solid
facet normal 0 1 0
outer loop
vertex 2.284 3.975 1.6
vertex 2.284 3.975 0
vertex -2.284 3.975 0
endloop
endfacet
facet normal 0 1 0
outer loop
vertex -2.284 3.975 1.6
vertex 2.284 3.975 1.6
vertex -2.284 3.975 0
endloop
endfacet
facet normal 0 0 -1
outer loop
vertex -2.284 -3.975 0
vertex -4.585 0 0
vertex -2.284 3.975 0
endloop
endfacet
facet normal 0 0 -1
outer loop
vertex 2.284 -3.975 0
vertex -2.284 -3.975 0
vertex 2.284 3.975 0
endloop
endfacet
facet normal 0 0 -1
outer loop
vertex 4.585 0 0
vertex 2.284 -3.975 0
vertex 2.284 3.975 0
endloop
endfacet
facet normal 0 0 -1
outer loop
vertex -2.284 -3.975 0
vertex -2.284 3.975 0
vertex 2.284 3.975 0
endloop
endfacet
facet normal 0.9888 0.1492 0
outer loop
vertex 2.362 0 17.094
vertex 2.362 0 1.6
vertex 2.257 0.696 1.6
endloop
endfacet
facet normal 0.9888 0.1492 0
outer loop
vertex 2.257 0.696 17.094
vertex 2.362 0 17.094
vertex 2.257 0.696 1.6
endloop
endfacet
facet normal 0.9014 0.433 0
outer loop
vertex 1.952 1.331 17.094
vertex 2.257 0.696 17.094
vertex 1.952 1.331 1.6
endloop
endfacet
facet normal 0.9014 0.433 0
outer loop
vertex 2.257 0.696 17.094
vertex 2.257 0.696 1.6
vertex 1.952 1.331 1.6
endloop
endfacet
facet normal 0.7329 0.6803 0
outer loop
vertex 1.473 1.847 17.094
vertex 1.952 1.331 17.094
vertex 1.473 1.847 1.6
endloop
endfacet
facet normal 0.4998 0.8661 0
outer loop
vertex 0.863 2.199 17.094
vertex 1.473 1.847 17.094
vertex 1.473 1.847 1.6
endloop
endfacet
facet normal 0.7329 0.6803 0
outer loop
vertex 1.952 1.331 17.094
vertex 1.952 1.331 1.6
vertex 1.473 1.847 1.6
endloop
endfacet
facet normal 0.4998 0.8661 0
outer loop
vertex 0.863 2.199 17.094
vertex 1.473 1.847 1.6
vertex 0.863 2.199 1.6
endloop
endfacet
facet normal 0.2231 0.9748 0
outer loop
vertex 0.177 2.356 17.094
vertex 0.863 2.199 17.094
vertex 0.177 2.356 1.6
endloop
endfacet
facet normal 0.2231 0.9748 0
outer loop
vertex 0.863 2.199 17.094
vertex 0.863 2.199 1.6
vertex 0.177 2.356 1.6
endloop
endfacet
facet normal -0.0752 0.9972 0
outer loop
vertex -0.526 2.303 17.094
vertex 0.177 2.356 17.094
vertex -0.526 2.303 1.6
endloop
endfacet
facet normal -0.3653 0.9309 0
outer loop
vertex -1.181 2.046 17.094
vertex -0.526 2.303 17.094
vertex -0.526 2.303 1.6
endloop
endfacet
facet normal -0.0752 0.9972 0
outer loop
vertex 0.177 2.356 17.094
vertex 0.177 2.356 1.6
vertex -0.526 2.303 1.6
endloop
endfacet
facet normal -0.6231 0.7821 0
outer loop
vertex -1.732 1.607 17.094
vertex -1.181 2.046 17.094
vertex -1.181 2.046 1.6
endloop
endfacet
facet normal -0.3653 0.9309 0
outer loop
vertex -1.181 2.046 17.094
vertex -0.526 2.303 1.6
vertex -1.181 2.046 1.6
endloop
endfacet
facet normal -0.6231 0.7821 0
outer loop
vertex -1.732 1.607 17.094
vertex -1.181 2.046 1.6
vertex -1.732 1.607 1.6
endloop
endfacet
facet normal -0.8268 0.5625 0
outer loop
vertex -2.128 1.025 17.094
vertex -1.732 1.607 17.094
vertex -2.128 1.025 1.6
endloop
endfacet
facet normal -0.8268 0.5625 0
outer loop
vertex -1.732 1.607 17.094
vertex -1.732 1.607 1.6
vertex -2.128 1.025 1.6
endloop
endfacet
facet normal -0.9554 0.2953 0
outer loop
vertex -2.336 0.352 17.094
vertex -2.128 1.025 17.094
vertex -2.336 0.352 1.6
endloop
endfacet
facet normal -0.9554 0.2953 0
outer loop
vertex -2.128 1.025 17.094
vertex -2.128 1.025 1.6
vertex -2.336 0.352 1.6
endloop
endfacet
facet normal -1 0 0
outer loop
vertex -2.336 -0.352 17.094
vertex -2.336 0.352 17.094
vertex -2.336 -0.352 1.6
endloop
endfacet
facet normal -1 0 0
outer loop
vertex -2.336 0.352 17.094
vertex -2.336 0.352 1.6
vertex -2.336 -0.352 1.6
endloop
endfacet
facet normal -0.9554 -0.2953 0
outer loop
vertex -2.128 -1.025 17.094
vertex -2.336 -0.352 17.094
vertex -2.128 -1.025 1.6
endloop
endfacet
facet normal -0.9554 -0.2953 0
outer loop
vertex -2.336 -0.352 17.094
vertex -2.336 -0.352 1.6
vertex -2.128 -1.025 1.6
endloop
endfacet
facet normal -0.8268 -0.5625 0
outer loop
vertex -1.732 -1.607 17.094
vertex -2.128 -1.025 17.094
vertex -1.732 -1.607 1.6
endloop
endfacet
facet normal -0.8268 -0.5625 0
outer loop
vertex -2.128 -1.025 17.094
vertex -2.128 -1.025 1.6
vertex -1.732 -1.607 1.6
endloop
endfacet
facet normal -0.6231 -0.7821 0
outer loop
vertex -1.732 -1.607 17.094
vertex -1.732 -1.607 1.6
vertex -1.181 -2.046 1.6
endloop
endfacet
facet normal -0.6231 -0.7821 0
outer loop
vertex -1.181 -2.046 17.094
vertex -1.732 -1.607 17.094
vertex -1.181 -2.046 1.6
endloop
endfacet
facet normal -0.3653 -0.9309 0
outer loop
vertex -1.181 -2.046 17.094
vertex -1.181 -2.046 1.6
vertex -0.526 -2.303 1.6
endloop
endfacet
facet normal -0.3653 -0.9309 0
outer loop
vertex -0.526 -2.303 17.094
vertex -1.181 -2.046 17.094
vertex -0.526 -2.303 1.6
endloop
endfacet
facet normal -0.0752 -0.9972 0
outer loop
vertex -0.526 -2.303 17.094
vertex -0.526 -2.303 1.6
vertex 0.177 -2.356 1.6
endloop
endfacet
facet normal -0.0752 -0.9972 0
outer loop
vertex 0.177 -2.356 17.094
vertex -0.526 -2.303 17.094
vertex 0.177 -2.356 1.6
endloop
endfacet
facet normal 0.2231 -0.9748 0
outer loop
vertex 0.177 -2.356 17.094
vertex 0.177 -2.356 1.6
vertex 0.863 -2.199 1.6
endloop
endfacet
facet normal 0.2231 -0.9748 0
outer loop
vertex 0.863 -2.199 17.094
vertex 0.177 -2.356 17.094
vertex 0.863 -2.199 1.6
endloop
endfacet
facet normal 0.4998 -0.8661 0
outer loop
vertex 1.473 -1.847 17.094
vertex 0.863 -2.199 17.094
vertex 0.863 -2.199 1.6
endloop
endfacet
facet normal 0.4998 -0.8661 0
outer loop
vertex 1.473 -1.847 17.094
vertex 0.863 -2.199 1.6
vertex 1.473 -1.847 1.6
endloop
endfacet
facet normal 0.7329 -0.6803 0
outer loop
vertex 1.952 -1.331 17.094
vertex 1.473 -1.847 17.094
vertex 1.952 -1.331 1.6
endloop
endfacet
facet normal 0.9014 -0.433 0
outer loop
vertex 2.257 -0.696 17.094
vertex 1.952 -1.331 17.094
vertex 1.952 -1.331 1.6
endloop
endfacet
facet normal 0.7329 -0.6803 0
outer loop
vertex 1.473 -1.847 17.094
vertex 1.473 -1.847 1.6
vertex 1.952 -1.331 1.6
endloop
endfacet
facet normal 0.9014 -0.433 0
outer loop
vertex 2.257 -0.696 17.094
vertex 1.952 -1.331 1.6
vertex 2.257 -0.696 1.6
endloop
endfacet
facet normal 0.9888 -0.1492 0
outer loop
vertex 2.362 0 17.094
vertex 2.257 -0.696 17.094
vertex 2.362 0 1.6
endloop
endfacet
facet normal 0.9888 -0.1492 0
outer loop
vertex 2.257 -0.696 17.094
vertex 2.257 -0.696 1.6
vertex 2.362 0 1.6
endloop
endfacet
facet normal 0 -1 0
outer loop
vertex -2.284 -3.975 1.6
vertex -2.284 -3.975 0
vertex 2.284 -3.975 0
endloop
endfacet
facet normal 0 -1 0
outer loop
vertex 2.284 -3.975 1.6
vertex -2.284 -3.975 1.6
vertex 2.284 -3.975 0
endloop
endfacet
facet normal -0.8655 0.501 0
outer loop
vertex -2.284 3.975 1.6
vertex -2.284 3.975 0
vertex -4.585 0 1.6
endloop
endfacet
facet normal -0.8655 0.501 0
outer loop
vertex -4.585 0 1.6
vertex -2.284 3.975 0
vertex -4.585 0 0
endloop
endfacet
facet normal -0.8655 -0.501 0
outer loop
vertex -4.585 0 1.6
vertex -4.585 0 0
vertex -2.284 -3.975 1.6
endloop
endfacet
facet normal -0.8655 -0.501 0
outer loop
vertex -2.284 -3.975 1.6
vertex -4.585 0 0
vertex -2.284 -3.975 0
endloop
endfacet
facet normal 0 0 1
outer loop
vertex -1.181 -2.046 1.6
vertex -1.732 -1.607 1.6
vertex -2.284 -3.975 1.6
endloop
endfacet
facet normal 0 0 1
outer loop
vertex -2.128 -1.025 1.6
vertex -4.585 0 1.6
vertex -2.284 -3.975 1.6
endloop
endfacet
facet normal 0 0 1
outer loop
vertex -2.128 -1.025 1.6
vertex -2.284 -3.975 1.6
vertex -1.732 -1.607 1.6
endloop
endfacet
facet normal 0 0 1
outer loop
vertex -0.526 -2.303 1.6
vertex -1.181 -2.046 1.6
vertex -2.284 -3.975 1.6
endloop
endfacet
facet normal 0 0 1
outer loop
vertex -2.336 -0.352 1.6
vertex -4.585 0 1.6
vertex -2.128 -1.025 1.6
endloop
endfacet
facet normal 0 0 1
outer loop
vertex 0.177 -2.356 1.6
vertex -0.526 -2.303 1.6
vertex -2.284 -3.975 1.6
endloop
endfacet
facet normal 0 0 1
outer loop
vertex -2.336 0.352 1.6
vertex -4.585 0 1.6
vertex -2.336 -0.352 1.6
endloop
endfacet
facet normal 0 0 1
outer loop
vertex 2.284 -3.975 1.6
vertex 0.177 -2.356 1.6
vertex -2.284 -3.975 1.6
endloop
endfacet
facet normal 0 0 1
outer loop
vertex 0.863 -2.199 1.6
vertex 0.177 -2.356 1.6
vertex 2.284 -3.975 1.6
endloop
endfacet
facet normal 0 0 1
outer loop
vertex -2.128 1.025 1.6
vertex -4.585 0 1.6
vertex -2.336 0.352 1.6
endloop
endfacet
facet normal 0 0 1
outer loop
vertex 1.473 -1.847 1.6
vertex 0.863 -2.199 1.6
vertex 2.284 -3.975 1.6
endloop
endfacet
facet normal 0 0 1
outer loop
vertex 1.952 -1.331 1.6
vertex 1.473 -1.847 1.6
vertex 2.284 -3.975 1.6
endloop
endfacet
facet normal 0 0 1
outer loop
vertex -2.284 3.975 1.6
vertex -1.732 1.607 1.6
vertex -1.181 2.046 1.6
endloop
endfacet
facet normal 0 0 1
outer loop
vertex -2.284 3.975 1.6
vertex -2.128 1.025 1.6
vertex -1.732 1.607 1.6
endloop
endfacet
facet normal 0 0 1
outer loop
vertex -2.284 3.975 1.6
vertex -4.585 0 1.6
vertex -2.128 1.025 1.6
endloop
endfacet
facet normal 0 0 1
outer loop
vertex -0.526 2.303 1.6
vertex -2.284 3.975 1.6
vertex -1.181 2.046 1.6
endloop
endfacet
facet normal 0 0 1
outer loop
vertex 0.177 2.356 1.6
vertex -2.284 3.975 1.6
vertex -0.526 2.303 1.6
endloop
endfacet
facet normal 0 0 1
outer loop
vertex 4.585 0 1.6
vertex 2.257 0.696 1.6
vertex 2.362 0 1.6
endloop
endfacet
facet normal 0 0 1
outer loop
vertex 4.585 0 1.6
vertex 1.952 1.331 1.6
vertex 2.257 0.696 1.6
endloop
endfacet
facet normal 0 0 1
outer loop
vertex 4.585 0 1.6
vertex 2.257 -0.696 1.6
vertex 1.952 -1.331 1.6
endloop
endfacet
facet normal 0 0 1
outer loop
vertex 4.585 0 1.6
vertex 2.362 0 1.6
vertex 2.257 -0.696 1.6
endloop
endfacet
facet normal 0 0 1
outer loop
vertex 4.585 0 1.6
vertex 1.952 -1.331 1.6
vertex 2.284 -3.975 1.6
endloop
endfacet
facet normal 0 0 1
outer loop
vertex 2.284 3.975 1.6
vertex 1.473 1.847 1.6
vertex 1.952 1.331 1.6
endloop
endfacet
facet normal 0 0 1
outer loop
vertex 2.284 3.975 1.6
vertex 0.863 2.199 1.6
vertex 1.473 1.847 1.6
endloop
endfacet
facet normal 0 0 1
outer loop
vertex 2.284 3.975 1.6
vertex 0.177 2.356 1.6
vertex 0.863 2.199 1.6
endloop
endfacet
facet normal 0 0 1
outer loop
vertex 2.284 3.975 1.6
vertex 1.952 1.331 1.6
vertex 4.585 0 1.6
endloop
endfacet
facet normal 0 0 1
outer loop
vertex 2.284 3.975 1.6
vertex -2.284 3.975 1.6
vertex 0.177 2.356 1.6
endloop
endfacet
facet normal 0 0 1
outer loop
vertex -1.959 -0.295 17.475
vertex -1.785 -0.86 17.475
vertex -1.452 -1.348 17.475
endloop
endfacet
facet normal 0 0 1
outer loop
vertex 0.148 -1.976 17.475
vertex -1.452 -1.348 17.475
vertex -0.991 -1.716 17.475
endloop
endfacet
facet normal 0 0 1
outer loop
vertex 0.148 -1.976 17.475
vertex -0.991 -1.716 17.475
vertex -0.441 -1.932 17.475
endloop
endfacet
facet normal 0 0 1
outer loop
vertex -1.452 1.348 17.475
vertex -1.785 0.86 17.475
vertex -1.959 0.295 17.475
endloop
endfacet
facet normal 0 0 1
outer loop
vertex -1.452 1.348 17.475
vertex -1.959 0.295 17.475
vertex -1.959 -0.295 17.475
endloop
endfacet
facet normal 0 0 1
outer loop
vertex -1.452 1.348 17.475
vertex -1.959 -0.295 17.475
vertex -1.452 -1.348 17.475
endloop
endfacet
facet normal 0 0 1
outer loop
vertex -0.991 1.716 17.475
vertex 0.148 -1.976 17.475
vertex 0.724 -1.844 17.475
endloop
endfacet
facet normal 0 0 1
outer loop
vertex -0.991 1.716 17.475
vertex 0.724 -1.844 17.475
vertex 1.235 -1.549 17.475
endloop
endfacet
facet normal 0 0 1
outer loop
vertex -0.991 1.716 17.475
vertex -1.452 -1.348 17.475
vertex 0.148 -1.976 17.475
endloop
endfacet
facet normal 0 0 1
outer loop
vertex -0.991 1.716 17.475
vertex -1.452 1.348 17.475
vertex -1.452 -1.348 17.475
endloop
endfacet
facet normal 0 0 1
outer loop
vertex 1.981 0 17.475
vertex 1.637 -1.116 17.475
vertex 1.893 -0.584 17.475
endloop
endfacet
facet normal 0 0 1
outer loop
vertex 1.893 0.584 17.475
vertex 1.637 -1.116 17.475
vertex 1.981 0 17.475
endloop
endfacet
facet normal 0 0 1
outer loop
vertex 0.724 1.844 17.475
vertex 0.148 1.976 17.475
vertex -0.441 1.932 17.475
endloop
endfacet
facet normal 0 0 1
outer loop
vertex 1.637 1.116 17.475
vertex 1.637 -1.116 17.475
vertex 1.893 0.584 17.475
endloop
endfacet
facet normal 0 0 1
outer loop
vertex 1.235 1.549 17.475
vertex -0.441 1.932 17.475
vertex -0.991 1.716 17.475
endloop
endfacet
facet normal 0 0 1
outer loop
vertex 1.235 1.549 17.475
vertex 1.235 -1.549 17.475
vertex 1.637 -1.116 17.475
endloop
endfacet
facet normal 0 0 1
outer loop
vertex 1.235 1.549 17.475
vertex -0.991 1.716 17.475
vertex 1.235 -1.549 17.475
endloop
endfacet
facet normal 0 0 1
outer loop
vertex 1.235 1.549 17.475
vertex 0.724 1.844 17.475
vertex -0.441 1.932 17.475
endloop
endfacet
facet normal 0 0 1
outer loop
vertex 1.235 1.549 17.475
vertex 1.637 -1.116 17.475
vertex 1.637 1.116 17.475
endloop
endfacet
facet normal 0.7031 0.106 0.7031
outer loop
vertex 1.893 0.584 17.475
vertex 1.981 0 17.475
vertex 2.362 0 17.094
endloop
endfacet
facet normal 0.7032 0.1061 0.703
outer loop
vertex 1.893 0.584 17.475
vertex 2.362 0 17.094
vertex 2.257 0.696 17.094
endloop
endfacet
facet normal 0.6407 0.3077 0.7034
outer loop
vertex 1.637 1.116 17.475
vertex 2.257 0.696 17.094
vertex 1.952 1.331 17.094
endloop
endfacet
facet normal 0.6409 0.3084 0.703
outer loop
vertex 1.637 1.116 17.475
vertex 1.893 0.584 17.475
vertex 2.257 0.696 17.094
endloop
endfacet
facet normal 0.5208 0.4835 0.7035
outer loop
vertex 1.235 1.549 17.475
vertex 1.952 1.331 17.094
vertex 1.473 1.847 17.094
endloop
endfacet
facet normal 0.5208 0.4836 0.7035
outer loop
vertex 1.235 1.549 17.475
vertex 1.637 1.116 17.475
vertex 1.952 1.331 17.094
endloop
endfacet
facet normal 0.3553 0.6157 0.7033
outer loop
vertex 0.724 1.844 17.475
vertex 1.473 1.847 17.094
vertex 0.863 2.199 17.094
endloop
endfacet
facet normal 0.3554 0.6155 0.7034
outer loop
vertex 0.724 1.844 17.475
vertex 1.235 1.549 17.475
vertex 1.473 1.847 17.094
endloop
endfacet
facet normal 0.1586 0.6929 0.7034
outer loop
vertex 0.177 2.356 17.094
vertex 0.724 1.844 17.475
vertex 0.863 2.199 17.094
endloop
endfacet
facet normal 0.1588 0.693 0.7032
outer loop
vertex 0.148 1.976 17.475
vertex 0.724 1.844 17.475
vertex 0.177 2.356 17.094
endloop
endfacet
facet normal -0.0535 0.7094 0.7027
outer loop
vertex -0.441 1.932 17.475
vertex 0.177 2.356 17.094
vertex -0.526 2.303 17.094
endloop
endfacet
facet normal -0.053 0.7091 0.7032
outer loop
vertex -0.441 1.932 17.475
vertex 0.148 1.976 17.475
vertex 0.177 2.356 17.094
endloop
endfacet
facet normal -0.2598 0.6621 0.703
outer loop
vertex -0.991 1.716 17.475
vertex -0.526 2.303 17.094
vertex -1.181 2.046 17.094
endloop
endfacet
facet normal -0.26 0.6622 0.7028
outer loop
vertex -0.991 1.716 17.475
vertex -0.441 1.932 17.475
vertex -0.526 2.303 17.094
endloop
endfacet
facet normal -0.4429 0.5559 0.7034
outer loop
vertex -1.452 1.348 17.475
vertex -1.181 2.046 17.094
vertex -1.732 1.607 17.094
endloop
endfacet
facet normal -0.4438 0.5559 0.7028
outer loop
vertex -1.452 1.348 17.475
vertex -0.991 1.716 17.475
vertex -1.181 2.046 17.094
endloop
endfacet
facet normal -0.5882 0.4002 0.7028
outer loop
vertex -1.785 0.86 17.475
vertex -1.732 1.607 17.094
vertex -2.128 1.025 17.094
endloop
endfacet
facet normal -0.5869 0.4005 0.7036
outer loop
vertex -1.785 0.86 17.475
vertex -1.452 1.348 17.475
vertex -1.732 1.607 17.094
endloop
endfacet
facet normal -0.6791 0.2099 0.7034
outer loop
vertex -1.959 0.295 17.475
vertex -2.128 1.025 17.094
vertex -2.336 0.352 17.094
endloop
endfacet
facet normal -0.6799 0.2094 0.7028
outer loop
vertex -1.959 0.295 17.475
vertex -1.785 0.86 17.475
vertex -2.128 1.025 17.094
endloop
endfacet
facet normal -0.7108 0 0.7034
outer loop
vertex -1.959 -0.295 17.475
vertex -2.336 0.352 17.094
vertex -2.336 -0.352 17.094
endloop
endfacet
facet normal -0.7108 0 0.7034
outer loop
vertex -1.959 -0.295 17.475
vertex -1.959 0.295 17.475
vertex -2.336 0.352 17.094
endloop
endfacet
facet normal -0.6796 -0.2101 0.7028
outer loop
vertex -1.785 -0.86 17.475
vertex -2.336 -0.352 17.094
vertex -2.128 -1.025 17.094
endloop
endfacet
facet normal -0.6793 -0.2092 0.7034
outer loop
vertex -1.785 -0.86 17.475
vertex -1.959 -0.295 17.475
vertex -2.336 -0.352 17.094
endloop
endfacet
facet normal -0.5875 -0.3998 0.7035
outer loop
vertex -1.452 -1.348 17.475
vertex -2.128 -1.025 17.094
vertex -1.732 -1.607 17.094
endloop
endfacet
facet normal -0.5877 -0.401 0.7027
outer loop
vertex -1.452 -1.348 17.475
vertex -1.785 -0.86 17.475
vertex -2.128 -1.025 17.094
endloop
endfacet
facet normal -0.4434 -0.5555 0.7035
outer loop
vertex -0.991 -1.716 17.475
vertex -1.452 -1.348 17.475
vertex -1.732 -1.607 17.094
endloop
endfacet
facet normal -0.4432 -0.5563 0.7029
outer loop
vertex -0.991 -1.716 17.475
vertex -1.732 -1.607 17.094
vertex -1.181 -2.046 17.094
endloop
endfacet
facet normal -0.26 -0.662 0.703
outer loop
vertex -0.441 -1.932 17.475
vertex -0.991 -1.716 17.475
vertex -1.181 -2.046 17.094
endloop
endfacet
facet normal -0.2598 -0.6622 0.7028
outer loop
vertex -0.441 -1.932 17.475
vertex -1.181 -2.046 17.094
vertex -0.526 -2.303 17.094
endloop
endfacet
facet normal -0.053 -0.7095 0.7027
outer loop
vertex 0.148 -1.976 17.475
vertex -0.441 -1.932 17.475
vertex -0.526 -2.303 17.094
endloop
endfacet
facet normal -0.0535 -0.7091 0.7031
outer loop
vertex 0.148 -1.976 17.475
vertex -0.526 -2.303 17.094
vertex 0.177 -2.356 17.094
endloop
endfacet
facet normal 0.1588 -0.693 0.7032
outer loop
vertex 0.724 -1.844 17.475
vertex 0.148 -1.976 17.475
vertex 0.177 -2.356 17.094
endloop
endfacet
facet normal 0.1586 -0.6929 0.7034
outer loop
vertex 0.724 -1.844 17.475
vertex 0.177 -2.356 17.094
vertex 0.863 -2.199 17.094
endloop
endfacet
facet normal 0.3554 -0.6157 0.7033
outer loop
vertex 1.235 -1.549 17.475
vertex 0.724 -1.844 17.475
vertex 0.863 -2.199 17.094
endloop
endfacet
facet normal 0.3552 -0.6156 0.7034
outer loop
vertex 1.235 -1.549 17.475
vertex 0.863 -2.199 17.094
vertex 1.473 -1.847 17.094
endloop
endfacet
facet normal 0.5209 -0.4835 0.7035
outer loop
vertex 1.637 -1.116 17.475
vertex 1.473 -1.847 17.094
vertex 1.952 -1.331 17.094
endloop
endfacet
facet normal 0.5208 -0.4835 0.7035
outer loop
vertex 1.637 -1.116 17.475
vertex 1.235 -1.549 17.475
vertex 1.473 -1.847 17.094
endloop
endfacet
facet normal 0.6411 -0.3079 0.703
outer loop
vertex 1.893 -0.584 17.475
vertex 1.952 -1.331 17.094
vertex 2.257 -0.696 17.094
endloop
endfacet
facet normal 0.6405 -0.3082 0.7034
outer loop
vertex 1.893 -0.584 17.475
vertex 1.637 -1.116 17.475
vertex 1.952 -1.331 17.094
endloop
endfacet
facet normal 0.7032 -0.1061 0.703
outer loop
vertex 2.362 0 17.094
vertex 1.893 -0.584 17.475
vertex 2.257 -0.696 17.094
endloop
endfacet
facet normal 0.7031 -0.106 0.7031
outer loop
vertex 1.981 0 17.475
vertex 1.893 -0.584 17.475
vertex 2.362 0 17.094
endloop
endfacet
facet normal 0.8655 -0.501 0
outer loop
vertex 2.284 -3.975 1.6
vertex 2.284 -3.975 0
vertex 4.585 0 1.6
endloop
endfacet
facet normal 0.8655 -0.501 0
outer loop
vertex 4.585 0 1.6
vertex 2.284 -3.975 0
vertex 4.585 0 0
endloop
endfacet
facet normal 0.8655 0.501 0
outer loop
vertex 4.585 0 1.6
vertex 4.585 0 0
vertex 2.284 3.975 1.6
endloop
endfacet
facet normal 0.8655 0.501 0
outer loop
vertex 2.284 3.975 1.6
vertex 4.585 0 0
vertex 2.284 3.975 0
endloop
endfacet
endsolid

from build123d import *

# Parameters (mm, degrees)
F1_DEPTH = 1.6002
F2_R     = 2.3622
F3_DEPTH = 15.875
F4_SIZE  = 0.381


with BuildPart() as f1:
    # F0 (on Top) → F1 (new body)
    with BuildSketch(Plane.XY):
        Polygon((2.284306, 3.9751), (-2.284306, 3.9751), (-4.5847, 0), (-2.284306, -3.9751), (2.284306, -3.9751), (4.5847, 0), align=None)
    extrude(amount=F1_DEPTH)

    # F2 (on face) → F3 (join)
    with BuildSketch(Plane.XY.offset(1.6002)):
        Circle(F2_R)
    extrude(amount=F3_DEPTH)

    # F4
    f4_edges = [f1.edges().sort_by_distance(p)[0] for p in [
        (-2.3622, 0, 17.4752),
    ]]
    chamfer(f4_edges, length=F4_SIZE)


solid = f1.part
